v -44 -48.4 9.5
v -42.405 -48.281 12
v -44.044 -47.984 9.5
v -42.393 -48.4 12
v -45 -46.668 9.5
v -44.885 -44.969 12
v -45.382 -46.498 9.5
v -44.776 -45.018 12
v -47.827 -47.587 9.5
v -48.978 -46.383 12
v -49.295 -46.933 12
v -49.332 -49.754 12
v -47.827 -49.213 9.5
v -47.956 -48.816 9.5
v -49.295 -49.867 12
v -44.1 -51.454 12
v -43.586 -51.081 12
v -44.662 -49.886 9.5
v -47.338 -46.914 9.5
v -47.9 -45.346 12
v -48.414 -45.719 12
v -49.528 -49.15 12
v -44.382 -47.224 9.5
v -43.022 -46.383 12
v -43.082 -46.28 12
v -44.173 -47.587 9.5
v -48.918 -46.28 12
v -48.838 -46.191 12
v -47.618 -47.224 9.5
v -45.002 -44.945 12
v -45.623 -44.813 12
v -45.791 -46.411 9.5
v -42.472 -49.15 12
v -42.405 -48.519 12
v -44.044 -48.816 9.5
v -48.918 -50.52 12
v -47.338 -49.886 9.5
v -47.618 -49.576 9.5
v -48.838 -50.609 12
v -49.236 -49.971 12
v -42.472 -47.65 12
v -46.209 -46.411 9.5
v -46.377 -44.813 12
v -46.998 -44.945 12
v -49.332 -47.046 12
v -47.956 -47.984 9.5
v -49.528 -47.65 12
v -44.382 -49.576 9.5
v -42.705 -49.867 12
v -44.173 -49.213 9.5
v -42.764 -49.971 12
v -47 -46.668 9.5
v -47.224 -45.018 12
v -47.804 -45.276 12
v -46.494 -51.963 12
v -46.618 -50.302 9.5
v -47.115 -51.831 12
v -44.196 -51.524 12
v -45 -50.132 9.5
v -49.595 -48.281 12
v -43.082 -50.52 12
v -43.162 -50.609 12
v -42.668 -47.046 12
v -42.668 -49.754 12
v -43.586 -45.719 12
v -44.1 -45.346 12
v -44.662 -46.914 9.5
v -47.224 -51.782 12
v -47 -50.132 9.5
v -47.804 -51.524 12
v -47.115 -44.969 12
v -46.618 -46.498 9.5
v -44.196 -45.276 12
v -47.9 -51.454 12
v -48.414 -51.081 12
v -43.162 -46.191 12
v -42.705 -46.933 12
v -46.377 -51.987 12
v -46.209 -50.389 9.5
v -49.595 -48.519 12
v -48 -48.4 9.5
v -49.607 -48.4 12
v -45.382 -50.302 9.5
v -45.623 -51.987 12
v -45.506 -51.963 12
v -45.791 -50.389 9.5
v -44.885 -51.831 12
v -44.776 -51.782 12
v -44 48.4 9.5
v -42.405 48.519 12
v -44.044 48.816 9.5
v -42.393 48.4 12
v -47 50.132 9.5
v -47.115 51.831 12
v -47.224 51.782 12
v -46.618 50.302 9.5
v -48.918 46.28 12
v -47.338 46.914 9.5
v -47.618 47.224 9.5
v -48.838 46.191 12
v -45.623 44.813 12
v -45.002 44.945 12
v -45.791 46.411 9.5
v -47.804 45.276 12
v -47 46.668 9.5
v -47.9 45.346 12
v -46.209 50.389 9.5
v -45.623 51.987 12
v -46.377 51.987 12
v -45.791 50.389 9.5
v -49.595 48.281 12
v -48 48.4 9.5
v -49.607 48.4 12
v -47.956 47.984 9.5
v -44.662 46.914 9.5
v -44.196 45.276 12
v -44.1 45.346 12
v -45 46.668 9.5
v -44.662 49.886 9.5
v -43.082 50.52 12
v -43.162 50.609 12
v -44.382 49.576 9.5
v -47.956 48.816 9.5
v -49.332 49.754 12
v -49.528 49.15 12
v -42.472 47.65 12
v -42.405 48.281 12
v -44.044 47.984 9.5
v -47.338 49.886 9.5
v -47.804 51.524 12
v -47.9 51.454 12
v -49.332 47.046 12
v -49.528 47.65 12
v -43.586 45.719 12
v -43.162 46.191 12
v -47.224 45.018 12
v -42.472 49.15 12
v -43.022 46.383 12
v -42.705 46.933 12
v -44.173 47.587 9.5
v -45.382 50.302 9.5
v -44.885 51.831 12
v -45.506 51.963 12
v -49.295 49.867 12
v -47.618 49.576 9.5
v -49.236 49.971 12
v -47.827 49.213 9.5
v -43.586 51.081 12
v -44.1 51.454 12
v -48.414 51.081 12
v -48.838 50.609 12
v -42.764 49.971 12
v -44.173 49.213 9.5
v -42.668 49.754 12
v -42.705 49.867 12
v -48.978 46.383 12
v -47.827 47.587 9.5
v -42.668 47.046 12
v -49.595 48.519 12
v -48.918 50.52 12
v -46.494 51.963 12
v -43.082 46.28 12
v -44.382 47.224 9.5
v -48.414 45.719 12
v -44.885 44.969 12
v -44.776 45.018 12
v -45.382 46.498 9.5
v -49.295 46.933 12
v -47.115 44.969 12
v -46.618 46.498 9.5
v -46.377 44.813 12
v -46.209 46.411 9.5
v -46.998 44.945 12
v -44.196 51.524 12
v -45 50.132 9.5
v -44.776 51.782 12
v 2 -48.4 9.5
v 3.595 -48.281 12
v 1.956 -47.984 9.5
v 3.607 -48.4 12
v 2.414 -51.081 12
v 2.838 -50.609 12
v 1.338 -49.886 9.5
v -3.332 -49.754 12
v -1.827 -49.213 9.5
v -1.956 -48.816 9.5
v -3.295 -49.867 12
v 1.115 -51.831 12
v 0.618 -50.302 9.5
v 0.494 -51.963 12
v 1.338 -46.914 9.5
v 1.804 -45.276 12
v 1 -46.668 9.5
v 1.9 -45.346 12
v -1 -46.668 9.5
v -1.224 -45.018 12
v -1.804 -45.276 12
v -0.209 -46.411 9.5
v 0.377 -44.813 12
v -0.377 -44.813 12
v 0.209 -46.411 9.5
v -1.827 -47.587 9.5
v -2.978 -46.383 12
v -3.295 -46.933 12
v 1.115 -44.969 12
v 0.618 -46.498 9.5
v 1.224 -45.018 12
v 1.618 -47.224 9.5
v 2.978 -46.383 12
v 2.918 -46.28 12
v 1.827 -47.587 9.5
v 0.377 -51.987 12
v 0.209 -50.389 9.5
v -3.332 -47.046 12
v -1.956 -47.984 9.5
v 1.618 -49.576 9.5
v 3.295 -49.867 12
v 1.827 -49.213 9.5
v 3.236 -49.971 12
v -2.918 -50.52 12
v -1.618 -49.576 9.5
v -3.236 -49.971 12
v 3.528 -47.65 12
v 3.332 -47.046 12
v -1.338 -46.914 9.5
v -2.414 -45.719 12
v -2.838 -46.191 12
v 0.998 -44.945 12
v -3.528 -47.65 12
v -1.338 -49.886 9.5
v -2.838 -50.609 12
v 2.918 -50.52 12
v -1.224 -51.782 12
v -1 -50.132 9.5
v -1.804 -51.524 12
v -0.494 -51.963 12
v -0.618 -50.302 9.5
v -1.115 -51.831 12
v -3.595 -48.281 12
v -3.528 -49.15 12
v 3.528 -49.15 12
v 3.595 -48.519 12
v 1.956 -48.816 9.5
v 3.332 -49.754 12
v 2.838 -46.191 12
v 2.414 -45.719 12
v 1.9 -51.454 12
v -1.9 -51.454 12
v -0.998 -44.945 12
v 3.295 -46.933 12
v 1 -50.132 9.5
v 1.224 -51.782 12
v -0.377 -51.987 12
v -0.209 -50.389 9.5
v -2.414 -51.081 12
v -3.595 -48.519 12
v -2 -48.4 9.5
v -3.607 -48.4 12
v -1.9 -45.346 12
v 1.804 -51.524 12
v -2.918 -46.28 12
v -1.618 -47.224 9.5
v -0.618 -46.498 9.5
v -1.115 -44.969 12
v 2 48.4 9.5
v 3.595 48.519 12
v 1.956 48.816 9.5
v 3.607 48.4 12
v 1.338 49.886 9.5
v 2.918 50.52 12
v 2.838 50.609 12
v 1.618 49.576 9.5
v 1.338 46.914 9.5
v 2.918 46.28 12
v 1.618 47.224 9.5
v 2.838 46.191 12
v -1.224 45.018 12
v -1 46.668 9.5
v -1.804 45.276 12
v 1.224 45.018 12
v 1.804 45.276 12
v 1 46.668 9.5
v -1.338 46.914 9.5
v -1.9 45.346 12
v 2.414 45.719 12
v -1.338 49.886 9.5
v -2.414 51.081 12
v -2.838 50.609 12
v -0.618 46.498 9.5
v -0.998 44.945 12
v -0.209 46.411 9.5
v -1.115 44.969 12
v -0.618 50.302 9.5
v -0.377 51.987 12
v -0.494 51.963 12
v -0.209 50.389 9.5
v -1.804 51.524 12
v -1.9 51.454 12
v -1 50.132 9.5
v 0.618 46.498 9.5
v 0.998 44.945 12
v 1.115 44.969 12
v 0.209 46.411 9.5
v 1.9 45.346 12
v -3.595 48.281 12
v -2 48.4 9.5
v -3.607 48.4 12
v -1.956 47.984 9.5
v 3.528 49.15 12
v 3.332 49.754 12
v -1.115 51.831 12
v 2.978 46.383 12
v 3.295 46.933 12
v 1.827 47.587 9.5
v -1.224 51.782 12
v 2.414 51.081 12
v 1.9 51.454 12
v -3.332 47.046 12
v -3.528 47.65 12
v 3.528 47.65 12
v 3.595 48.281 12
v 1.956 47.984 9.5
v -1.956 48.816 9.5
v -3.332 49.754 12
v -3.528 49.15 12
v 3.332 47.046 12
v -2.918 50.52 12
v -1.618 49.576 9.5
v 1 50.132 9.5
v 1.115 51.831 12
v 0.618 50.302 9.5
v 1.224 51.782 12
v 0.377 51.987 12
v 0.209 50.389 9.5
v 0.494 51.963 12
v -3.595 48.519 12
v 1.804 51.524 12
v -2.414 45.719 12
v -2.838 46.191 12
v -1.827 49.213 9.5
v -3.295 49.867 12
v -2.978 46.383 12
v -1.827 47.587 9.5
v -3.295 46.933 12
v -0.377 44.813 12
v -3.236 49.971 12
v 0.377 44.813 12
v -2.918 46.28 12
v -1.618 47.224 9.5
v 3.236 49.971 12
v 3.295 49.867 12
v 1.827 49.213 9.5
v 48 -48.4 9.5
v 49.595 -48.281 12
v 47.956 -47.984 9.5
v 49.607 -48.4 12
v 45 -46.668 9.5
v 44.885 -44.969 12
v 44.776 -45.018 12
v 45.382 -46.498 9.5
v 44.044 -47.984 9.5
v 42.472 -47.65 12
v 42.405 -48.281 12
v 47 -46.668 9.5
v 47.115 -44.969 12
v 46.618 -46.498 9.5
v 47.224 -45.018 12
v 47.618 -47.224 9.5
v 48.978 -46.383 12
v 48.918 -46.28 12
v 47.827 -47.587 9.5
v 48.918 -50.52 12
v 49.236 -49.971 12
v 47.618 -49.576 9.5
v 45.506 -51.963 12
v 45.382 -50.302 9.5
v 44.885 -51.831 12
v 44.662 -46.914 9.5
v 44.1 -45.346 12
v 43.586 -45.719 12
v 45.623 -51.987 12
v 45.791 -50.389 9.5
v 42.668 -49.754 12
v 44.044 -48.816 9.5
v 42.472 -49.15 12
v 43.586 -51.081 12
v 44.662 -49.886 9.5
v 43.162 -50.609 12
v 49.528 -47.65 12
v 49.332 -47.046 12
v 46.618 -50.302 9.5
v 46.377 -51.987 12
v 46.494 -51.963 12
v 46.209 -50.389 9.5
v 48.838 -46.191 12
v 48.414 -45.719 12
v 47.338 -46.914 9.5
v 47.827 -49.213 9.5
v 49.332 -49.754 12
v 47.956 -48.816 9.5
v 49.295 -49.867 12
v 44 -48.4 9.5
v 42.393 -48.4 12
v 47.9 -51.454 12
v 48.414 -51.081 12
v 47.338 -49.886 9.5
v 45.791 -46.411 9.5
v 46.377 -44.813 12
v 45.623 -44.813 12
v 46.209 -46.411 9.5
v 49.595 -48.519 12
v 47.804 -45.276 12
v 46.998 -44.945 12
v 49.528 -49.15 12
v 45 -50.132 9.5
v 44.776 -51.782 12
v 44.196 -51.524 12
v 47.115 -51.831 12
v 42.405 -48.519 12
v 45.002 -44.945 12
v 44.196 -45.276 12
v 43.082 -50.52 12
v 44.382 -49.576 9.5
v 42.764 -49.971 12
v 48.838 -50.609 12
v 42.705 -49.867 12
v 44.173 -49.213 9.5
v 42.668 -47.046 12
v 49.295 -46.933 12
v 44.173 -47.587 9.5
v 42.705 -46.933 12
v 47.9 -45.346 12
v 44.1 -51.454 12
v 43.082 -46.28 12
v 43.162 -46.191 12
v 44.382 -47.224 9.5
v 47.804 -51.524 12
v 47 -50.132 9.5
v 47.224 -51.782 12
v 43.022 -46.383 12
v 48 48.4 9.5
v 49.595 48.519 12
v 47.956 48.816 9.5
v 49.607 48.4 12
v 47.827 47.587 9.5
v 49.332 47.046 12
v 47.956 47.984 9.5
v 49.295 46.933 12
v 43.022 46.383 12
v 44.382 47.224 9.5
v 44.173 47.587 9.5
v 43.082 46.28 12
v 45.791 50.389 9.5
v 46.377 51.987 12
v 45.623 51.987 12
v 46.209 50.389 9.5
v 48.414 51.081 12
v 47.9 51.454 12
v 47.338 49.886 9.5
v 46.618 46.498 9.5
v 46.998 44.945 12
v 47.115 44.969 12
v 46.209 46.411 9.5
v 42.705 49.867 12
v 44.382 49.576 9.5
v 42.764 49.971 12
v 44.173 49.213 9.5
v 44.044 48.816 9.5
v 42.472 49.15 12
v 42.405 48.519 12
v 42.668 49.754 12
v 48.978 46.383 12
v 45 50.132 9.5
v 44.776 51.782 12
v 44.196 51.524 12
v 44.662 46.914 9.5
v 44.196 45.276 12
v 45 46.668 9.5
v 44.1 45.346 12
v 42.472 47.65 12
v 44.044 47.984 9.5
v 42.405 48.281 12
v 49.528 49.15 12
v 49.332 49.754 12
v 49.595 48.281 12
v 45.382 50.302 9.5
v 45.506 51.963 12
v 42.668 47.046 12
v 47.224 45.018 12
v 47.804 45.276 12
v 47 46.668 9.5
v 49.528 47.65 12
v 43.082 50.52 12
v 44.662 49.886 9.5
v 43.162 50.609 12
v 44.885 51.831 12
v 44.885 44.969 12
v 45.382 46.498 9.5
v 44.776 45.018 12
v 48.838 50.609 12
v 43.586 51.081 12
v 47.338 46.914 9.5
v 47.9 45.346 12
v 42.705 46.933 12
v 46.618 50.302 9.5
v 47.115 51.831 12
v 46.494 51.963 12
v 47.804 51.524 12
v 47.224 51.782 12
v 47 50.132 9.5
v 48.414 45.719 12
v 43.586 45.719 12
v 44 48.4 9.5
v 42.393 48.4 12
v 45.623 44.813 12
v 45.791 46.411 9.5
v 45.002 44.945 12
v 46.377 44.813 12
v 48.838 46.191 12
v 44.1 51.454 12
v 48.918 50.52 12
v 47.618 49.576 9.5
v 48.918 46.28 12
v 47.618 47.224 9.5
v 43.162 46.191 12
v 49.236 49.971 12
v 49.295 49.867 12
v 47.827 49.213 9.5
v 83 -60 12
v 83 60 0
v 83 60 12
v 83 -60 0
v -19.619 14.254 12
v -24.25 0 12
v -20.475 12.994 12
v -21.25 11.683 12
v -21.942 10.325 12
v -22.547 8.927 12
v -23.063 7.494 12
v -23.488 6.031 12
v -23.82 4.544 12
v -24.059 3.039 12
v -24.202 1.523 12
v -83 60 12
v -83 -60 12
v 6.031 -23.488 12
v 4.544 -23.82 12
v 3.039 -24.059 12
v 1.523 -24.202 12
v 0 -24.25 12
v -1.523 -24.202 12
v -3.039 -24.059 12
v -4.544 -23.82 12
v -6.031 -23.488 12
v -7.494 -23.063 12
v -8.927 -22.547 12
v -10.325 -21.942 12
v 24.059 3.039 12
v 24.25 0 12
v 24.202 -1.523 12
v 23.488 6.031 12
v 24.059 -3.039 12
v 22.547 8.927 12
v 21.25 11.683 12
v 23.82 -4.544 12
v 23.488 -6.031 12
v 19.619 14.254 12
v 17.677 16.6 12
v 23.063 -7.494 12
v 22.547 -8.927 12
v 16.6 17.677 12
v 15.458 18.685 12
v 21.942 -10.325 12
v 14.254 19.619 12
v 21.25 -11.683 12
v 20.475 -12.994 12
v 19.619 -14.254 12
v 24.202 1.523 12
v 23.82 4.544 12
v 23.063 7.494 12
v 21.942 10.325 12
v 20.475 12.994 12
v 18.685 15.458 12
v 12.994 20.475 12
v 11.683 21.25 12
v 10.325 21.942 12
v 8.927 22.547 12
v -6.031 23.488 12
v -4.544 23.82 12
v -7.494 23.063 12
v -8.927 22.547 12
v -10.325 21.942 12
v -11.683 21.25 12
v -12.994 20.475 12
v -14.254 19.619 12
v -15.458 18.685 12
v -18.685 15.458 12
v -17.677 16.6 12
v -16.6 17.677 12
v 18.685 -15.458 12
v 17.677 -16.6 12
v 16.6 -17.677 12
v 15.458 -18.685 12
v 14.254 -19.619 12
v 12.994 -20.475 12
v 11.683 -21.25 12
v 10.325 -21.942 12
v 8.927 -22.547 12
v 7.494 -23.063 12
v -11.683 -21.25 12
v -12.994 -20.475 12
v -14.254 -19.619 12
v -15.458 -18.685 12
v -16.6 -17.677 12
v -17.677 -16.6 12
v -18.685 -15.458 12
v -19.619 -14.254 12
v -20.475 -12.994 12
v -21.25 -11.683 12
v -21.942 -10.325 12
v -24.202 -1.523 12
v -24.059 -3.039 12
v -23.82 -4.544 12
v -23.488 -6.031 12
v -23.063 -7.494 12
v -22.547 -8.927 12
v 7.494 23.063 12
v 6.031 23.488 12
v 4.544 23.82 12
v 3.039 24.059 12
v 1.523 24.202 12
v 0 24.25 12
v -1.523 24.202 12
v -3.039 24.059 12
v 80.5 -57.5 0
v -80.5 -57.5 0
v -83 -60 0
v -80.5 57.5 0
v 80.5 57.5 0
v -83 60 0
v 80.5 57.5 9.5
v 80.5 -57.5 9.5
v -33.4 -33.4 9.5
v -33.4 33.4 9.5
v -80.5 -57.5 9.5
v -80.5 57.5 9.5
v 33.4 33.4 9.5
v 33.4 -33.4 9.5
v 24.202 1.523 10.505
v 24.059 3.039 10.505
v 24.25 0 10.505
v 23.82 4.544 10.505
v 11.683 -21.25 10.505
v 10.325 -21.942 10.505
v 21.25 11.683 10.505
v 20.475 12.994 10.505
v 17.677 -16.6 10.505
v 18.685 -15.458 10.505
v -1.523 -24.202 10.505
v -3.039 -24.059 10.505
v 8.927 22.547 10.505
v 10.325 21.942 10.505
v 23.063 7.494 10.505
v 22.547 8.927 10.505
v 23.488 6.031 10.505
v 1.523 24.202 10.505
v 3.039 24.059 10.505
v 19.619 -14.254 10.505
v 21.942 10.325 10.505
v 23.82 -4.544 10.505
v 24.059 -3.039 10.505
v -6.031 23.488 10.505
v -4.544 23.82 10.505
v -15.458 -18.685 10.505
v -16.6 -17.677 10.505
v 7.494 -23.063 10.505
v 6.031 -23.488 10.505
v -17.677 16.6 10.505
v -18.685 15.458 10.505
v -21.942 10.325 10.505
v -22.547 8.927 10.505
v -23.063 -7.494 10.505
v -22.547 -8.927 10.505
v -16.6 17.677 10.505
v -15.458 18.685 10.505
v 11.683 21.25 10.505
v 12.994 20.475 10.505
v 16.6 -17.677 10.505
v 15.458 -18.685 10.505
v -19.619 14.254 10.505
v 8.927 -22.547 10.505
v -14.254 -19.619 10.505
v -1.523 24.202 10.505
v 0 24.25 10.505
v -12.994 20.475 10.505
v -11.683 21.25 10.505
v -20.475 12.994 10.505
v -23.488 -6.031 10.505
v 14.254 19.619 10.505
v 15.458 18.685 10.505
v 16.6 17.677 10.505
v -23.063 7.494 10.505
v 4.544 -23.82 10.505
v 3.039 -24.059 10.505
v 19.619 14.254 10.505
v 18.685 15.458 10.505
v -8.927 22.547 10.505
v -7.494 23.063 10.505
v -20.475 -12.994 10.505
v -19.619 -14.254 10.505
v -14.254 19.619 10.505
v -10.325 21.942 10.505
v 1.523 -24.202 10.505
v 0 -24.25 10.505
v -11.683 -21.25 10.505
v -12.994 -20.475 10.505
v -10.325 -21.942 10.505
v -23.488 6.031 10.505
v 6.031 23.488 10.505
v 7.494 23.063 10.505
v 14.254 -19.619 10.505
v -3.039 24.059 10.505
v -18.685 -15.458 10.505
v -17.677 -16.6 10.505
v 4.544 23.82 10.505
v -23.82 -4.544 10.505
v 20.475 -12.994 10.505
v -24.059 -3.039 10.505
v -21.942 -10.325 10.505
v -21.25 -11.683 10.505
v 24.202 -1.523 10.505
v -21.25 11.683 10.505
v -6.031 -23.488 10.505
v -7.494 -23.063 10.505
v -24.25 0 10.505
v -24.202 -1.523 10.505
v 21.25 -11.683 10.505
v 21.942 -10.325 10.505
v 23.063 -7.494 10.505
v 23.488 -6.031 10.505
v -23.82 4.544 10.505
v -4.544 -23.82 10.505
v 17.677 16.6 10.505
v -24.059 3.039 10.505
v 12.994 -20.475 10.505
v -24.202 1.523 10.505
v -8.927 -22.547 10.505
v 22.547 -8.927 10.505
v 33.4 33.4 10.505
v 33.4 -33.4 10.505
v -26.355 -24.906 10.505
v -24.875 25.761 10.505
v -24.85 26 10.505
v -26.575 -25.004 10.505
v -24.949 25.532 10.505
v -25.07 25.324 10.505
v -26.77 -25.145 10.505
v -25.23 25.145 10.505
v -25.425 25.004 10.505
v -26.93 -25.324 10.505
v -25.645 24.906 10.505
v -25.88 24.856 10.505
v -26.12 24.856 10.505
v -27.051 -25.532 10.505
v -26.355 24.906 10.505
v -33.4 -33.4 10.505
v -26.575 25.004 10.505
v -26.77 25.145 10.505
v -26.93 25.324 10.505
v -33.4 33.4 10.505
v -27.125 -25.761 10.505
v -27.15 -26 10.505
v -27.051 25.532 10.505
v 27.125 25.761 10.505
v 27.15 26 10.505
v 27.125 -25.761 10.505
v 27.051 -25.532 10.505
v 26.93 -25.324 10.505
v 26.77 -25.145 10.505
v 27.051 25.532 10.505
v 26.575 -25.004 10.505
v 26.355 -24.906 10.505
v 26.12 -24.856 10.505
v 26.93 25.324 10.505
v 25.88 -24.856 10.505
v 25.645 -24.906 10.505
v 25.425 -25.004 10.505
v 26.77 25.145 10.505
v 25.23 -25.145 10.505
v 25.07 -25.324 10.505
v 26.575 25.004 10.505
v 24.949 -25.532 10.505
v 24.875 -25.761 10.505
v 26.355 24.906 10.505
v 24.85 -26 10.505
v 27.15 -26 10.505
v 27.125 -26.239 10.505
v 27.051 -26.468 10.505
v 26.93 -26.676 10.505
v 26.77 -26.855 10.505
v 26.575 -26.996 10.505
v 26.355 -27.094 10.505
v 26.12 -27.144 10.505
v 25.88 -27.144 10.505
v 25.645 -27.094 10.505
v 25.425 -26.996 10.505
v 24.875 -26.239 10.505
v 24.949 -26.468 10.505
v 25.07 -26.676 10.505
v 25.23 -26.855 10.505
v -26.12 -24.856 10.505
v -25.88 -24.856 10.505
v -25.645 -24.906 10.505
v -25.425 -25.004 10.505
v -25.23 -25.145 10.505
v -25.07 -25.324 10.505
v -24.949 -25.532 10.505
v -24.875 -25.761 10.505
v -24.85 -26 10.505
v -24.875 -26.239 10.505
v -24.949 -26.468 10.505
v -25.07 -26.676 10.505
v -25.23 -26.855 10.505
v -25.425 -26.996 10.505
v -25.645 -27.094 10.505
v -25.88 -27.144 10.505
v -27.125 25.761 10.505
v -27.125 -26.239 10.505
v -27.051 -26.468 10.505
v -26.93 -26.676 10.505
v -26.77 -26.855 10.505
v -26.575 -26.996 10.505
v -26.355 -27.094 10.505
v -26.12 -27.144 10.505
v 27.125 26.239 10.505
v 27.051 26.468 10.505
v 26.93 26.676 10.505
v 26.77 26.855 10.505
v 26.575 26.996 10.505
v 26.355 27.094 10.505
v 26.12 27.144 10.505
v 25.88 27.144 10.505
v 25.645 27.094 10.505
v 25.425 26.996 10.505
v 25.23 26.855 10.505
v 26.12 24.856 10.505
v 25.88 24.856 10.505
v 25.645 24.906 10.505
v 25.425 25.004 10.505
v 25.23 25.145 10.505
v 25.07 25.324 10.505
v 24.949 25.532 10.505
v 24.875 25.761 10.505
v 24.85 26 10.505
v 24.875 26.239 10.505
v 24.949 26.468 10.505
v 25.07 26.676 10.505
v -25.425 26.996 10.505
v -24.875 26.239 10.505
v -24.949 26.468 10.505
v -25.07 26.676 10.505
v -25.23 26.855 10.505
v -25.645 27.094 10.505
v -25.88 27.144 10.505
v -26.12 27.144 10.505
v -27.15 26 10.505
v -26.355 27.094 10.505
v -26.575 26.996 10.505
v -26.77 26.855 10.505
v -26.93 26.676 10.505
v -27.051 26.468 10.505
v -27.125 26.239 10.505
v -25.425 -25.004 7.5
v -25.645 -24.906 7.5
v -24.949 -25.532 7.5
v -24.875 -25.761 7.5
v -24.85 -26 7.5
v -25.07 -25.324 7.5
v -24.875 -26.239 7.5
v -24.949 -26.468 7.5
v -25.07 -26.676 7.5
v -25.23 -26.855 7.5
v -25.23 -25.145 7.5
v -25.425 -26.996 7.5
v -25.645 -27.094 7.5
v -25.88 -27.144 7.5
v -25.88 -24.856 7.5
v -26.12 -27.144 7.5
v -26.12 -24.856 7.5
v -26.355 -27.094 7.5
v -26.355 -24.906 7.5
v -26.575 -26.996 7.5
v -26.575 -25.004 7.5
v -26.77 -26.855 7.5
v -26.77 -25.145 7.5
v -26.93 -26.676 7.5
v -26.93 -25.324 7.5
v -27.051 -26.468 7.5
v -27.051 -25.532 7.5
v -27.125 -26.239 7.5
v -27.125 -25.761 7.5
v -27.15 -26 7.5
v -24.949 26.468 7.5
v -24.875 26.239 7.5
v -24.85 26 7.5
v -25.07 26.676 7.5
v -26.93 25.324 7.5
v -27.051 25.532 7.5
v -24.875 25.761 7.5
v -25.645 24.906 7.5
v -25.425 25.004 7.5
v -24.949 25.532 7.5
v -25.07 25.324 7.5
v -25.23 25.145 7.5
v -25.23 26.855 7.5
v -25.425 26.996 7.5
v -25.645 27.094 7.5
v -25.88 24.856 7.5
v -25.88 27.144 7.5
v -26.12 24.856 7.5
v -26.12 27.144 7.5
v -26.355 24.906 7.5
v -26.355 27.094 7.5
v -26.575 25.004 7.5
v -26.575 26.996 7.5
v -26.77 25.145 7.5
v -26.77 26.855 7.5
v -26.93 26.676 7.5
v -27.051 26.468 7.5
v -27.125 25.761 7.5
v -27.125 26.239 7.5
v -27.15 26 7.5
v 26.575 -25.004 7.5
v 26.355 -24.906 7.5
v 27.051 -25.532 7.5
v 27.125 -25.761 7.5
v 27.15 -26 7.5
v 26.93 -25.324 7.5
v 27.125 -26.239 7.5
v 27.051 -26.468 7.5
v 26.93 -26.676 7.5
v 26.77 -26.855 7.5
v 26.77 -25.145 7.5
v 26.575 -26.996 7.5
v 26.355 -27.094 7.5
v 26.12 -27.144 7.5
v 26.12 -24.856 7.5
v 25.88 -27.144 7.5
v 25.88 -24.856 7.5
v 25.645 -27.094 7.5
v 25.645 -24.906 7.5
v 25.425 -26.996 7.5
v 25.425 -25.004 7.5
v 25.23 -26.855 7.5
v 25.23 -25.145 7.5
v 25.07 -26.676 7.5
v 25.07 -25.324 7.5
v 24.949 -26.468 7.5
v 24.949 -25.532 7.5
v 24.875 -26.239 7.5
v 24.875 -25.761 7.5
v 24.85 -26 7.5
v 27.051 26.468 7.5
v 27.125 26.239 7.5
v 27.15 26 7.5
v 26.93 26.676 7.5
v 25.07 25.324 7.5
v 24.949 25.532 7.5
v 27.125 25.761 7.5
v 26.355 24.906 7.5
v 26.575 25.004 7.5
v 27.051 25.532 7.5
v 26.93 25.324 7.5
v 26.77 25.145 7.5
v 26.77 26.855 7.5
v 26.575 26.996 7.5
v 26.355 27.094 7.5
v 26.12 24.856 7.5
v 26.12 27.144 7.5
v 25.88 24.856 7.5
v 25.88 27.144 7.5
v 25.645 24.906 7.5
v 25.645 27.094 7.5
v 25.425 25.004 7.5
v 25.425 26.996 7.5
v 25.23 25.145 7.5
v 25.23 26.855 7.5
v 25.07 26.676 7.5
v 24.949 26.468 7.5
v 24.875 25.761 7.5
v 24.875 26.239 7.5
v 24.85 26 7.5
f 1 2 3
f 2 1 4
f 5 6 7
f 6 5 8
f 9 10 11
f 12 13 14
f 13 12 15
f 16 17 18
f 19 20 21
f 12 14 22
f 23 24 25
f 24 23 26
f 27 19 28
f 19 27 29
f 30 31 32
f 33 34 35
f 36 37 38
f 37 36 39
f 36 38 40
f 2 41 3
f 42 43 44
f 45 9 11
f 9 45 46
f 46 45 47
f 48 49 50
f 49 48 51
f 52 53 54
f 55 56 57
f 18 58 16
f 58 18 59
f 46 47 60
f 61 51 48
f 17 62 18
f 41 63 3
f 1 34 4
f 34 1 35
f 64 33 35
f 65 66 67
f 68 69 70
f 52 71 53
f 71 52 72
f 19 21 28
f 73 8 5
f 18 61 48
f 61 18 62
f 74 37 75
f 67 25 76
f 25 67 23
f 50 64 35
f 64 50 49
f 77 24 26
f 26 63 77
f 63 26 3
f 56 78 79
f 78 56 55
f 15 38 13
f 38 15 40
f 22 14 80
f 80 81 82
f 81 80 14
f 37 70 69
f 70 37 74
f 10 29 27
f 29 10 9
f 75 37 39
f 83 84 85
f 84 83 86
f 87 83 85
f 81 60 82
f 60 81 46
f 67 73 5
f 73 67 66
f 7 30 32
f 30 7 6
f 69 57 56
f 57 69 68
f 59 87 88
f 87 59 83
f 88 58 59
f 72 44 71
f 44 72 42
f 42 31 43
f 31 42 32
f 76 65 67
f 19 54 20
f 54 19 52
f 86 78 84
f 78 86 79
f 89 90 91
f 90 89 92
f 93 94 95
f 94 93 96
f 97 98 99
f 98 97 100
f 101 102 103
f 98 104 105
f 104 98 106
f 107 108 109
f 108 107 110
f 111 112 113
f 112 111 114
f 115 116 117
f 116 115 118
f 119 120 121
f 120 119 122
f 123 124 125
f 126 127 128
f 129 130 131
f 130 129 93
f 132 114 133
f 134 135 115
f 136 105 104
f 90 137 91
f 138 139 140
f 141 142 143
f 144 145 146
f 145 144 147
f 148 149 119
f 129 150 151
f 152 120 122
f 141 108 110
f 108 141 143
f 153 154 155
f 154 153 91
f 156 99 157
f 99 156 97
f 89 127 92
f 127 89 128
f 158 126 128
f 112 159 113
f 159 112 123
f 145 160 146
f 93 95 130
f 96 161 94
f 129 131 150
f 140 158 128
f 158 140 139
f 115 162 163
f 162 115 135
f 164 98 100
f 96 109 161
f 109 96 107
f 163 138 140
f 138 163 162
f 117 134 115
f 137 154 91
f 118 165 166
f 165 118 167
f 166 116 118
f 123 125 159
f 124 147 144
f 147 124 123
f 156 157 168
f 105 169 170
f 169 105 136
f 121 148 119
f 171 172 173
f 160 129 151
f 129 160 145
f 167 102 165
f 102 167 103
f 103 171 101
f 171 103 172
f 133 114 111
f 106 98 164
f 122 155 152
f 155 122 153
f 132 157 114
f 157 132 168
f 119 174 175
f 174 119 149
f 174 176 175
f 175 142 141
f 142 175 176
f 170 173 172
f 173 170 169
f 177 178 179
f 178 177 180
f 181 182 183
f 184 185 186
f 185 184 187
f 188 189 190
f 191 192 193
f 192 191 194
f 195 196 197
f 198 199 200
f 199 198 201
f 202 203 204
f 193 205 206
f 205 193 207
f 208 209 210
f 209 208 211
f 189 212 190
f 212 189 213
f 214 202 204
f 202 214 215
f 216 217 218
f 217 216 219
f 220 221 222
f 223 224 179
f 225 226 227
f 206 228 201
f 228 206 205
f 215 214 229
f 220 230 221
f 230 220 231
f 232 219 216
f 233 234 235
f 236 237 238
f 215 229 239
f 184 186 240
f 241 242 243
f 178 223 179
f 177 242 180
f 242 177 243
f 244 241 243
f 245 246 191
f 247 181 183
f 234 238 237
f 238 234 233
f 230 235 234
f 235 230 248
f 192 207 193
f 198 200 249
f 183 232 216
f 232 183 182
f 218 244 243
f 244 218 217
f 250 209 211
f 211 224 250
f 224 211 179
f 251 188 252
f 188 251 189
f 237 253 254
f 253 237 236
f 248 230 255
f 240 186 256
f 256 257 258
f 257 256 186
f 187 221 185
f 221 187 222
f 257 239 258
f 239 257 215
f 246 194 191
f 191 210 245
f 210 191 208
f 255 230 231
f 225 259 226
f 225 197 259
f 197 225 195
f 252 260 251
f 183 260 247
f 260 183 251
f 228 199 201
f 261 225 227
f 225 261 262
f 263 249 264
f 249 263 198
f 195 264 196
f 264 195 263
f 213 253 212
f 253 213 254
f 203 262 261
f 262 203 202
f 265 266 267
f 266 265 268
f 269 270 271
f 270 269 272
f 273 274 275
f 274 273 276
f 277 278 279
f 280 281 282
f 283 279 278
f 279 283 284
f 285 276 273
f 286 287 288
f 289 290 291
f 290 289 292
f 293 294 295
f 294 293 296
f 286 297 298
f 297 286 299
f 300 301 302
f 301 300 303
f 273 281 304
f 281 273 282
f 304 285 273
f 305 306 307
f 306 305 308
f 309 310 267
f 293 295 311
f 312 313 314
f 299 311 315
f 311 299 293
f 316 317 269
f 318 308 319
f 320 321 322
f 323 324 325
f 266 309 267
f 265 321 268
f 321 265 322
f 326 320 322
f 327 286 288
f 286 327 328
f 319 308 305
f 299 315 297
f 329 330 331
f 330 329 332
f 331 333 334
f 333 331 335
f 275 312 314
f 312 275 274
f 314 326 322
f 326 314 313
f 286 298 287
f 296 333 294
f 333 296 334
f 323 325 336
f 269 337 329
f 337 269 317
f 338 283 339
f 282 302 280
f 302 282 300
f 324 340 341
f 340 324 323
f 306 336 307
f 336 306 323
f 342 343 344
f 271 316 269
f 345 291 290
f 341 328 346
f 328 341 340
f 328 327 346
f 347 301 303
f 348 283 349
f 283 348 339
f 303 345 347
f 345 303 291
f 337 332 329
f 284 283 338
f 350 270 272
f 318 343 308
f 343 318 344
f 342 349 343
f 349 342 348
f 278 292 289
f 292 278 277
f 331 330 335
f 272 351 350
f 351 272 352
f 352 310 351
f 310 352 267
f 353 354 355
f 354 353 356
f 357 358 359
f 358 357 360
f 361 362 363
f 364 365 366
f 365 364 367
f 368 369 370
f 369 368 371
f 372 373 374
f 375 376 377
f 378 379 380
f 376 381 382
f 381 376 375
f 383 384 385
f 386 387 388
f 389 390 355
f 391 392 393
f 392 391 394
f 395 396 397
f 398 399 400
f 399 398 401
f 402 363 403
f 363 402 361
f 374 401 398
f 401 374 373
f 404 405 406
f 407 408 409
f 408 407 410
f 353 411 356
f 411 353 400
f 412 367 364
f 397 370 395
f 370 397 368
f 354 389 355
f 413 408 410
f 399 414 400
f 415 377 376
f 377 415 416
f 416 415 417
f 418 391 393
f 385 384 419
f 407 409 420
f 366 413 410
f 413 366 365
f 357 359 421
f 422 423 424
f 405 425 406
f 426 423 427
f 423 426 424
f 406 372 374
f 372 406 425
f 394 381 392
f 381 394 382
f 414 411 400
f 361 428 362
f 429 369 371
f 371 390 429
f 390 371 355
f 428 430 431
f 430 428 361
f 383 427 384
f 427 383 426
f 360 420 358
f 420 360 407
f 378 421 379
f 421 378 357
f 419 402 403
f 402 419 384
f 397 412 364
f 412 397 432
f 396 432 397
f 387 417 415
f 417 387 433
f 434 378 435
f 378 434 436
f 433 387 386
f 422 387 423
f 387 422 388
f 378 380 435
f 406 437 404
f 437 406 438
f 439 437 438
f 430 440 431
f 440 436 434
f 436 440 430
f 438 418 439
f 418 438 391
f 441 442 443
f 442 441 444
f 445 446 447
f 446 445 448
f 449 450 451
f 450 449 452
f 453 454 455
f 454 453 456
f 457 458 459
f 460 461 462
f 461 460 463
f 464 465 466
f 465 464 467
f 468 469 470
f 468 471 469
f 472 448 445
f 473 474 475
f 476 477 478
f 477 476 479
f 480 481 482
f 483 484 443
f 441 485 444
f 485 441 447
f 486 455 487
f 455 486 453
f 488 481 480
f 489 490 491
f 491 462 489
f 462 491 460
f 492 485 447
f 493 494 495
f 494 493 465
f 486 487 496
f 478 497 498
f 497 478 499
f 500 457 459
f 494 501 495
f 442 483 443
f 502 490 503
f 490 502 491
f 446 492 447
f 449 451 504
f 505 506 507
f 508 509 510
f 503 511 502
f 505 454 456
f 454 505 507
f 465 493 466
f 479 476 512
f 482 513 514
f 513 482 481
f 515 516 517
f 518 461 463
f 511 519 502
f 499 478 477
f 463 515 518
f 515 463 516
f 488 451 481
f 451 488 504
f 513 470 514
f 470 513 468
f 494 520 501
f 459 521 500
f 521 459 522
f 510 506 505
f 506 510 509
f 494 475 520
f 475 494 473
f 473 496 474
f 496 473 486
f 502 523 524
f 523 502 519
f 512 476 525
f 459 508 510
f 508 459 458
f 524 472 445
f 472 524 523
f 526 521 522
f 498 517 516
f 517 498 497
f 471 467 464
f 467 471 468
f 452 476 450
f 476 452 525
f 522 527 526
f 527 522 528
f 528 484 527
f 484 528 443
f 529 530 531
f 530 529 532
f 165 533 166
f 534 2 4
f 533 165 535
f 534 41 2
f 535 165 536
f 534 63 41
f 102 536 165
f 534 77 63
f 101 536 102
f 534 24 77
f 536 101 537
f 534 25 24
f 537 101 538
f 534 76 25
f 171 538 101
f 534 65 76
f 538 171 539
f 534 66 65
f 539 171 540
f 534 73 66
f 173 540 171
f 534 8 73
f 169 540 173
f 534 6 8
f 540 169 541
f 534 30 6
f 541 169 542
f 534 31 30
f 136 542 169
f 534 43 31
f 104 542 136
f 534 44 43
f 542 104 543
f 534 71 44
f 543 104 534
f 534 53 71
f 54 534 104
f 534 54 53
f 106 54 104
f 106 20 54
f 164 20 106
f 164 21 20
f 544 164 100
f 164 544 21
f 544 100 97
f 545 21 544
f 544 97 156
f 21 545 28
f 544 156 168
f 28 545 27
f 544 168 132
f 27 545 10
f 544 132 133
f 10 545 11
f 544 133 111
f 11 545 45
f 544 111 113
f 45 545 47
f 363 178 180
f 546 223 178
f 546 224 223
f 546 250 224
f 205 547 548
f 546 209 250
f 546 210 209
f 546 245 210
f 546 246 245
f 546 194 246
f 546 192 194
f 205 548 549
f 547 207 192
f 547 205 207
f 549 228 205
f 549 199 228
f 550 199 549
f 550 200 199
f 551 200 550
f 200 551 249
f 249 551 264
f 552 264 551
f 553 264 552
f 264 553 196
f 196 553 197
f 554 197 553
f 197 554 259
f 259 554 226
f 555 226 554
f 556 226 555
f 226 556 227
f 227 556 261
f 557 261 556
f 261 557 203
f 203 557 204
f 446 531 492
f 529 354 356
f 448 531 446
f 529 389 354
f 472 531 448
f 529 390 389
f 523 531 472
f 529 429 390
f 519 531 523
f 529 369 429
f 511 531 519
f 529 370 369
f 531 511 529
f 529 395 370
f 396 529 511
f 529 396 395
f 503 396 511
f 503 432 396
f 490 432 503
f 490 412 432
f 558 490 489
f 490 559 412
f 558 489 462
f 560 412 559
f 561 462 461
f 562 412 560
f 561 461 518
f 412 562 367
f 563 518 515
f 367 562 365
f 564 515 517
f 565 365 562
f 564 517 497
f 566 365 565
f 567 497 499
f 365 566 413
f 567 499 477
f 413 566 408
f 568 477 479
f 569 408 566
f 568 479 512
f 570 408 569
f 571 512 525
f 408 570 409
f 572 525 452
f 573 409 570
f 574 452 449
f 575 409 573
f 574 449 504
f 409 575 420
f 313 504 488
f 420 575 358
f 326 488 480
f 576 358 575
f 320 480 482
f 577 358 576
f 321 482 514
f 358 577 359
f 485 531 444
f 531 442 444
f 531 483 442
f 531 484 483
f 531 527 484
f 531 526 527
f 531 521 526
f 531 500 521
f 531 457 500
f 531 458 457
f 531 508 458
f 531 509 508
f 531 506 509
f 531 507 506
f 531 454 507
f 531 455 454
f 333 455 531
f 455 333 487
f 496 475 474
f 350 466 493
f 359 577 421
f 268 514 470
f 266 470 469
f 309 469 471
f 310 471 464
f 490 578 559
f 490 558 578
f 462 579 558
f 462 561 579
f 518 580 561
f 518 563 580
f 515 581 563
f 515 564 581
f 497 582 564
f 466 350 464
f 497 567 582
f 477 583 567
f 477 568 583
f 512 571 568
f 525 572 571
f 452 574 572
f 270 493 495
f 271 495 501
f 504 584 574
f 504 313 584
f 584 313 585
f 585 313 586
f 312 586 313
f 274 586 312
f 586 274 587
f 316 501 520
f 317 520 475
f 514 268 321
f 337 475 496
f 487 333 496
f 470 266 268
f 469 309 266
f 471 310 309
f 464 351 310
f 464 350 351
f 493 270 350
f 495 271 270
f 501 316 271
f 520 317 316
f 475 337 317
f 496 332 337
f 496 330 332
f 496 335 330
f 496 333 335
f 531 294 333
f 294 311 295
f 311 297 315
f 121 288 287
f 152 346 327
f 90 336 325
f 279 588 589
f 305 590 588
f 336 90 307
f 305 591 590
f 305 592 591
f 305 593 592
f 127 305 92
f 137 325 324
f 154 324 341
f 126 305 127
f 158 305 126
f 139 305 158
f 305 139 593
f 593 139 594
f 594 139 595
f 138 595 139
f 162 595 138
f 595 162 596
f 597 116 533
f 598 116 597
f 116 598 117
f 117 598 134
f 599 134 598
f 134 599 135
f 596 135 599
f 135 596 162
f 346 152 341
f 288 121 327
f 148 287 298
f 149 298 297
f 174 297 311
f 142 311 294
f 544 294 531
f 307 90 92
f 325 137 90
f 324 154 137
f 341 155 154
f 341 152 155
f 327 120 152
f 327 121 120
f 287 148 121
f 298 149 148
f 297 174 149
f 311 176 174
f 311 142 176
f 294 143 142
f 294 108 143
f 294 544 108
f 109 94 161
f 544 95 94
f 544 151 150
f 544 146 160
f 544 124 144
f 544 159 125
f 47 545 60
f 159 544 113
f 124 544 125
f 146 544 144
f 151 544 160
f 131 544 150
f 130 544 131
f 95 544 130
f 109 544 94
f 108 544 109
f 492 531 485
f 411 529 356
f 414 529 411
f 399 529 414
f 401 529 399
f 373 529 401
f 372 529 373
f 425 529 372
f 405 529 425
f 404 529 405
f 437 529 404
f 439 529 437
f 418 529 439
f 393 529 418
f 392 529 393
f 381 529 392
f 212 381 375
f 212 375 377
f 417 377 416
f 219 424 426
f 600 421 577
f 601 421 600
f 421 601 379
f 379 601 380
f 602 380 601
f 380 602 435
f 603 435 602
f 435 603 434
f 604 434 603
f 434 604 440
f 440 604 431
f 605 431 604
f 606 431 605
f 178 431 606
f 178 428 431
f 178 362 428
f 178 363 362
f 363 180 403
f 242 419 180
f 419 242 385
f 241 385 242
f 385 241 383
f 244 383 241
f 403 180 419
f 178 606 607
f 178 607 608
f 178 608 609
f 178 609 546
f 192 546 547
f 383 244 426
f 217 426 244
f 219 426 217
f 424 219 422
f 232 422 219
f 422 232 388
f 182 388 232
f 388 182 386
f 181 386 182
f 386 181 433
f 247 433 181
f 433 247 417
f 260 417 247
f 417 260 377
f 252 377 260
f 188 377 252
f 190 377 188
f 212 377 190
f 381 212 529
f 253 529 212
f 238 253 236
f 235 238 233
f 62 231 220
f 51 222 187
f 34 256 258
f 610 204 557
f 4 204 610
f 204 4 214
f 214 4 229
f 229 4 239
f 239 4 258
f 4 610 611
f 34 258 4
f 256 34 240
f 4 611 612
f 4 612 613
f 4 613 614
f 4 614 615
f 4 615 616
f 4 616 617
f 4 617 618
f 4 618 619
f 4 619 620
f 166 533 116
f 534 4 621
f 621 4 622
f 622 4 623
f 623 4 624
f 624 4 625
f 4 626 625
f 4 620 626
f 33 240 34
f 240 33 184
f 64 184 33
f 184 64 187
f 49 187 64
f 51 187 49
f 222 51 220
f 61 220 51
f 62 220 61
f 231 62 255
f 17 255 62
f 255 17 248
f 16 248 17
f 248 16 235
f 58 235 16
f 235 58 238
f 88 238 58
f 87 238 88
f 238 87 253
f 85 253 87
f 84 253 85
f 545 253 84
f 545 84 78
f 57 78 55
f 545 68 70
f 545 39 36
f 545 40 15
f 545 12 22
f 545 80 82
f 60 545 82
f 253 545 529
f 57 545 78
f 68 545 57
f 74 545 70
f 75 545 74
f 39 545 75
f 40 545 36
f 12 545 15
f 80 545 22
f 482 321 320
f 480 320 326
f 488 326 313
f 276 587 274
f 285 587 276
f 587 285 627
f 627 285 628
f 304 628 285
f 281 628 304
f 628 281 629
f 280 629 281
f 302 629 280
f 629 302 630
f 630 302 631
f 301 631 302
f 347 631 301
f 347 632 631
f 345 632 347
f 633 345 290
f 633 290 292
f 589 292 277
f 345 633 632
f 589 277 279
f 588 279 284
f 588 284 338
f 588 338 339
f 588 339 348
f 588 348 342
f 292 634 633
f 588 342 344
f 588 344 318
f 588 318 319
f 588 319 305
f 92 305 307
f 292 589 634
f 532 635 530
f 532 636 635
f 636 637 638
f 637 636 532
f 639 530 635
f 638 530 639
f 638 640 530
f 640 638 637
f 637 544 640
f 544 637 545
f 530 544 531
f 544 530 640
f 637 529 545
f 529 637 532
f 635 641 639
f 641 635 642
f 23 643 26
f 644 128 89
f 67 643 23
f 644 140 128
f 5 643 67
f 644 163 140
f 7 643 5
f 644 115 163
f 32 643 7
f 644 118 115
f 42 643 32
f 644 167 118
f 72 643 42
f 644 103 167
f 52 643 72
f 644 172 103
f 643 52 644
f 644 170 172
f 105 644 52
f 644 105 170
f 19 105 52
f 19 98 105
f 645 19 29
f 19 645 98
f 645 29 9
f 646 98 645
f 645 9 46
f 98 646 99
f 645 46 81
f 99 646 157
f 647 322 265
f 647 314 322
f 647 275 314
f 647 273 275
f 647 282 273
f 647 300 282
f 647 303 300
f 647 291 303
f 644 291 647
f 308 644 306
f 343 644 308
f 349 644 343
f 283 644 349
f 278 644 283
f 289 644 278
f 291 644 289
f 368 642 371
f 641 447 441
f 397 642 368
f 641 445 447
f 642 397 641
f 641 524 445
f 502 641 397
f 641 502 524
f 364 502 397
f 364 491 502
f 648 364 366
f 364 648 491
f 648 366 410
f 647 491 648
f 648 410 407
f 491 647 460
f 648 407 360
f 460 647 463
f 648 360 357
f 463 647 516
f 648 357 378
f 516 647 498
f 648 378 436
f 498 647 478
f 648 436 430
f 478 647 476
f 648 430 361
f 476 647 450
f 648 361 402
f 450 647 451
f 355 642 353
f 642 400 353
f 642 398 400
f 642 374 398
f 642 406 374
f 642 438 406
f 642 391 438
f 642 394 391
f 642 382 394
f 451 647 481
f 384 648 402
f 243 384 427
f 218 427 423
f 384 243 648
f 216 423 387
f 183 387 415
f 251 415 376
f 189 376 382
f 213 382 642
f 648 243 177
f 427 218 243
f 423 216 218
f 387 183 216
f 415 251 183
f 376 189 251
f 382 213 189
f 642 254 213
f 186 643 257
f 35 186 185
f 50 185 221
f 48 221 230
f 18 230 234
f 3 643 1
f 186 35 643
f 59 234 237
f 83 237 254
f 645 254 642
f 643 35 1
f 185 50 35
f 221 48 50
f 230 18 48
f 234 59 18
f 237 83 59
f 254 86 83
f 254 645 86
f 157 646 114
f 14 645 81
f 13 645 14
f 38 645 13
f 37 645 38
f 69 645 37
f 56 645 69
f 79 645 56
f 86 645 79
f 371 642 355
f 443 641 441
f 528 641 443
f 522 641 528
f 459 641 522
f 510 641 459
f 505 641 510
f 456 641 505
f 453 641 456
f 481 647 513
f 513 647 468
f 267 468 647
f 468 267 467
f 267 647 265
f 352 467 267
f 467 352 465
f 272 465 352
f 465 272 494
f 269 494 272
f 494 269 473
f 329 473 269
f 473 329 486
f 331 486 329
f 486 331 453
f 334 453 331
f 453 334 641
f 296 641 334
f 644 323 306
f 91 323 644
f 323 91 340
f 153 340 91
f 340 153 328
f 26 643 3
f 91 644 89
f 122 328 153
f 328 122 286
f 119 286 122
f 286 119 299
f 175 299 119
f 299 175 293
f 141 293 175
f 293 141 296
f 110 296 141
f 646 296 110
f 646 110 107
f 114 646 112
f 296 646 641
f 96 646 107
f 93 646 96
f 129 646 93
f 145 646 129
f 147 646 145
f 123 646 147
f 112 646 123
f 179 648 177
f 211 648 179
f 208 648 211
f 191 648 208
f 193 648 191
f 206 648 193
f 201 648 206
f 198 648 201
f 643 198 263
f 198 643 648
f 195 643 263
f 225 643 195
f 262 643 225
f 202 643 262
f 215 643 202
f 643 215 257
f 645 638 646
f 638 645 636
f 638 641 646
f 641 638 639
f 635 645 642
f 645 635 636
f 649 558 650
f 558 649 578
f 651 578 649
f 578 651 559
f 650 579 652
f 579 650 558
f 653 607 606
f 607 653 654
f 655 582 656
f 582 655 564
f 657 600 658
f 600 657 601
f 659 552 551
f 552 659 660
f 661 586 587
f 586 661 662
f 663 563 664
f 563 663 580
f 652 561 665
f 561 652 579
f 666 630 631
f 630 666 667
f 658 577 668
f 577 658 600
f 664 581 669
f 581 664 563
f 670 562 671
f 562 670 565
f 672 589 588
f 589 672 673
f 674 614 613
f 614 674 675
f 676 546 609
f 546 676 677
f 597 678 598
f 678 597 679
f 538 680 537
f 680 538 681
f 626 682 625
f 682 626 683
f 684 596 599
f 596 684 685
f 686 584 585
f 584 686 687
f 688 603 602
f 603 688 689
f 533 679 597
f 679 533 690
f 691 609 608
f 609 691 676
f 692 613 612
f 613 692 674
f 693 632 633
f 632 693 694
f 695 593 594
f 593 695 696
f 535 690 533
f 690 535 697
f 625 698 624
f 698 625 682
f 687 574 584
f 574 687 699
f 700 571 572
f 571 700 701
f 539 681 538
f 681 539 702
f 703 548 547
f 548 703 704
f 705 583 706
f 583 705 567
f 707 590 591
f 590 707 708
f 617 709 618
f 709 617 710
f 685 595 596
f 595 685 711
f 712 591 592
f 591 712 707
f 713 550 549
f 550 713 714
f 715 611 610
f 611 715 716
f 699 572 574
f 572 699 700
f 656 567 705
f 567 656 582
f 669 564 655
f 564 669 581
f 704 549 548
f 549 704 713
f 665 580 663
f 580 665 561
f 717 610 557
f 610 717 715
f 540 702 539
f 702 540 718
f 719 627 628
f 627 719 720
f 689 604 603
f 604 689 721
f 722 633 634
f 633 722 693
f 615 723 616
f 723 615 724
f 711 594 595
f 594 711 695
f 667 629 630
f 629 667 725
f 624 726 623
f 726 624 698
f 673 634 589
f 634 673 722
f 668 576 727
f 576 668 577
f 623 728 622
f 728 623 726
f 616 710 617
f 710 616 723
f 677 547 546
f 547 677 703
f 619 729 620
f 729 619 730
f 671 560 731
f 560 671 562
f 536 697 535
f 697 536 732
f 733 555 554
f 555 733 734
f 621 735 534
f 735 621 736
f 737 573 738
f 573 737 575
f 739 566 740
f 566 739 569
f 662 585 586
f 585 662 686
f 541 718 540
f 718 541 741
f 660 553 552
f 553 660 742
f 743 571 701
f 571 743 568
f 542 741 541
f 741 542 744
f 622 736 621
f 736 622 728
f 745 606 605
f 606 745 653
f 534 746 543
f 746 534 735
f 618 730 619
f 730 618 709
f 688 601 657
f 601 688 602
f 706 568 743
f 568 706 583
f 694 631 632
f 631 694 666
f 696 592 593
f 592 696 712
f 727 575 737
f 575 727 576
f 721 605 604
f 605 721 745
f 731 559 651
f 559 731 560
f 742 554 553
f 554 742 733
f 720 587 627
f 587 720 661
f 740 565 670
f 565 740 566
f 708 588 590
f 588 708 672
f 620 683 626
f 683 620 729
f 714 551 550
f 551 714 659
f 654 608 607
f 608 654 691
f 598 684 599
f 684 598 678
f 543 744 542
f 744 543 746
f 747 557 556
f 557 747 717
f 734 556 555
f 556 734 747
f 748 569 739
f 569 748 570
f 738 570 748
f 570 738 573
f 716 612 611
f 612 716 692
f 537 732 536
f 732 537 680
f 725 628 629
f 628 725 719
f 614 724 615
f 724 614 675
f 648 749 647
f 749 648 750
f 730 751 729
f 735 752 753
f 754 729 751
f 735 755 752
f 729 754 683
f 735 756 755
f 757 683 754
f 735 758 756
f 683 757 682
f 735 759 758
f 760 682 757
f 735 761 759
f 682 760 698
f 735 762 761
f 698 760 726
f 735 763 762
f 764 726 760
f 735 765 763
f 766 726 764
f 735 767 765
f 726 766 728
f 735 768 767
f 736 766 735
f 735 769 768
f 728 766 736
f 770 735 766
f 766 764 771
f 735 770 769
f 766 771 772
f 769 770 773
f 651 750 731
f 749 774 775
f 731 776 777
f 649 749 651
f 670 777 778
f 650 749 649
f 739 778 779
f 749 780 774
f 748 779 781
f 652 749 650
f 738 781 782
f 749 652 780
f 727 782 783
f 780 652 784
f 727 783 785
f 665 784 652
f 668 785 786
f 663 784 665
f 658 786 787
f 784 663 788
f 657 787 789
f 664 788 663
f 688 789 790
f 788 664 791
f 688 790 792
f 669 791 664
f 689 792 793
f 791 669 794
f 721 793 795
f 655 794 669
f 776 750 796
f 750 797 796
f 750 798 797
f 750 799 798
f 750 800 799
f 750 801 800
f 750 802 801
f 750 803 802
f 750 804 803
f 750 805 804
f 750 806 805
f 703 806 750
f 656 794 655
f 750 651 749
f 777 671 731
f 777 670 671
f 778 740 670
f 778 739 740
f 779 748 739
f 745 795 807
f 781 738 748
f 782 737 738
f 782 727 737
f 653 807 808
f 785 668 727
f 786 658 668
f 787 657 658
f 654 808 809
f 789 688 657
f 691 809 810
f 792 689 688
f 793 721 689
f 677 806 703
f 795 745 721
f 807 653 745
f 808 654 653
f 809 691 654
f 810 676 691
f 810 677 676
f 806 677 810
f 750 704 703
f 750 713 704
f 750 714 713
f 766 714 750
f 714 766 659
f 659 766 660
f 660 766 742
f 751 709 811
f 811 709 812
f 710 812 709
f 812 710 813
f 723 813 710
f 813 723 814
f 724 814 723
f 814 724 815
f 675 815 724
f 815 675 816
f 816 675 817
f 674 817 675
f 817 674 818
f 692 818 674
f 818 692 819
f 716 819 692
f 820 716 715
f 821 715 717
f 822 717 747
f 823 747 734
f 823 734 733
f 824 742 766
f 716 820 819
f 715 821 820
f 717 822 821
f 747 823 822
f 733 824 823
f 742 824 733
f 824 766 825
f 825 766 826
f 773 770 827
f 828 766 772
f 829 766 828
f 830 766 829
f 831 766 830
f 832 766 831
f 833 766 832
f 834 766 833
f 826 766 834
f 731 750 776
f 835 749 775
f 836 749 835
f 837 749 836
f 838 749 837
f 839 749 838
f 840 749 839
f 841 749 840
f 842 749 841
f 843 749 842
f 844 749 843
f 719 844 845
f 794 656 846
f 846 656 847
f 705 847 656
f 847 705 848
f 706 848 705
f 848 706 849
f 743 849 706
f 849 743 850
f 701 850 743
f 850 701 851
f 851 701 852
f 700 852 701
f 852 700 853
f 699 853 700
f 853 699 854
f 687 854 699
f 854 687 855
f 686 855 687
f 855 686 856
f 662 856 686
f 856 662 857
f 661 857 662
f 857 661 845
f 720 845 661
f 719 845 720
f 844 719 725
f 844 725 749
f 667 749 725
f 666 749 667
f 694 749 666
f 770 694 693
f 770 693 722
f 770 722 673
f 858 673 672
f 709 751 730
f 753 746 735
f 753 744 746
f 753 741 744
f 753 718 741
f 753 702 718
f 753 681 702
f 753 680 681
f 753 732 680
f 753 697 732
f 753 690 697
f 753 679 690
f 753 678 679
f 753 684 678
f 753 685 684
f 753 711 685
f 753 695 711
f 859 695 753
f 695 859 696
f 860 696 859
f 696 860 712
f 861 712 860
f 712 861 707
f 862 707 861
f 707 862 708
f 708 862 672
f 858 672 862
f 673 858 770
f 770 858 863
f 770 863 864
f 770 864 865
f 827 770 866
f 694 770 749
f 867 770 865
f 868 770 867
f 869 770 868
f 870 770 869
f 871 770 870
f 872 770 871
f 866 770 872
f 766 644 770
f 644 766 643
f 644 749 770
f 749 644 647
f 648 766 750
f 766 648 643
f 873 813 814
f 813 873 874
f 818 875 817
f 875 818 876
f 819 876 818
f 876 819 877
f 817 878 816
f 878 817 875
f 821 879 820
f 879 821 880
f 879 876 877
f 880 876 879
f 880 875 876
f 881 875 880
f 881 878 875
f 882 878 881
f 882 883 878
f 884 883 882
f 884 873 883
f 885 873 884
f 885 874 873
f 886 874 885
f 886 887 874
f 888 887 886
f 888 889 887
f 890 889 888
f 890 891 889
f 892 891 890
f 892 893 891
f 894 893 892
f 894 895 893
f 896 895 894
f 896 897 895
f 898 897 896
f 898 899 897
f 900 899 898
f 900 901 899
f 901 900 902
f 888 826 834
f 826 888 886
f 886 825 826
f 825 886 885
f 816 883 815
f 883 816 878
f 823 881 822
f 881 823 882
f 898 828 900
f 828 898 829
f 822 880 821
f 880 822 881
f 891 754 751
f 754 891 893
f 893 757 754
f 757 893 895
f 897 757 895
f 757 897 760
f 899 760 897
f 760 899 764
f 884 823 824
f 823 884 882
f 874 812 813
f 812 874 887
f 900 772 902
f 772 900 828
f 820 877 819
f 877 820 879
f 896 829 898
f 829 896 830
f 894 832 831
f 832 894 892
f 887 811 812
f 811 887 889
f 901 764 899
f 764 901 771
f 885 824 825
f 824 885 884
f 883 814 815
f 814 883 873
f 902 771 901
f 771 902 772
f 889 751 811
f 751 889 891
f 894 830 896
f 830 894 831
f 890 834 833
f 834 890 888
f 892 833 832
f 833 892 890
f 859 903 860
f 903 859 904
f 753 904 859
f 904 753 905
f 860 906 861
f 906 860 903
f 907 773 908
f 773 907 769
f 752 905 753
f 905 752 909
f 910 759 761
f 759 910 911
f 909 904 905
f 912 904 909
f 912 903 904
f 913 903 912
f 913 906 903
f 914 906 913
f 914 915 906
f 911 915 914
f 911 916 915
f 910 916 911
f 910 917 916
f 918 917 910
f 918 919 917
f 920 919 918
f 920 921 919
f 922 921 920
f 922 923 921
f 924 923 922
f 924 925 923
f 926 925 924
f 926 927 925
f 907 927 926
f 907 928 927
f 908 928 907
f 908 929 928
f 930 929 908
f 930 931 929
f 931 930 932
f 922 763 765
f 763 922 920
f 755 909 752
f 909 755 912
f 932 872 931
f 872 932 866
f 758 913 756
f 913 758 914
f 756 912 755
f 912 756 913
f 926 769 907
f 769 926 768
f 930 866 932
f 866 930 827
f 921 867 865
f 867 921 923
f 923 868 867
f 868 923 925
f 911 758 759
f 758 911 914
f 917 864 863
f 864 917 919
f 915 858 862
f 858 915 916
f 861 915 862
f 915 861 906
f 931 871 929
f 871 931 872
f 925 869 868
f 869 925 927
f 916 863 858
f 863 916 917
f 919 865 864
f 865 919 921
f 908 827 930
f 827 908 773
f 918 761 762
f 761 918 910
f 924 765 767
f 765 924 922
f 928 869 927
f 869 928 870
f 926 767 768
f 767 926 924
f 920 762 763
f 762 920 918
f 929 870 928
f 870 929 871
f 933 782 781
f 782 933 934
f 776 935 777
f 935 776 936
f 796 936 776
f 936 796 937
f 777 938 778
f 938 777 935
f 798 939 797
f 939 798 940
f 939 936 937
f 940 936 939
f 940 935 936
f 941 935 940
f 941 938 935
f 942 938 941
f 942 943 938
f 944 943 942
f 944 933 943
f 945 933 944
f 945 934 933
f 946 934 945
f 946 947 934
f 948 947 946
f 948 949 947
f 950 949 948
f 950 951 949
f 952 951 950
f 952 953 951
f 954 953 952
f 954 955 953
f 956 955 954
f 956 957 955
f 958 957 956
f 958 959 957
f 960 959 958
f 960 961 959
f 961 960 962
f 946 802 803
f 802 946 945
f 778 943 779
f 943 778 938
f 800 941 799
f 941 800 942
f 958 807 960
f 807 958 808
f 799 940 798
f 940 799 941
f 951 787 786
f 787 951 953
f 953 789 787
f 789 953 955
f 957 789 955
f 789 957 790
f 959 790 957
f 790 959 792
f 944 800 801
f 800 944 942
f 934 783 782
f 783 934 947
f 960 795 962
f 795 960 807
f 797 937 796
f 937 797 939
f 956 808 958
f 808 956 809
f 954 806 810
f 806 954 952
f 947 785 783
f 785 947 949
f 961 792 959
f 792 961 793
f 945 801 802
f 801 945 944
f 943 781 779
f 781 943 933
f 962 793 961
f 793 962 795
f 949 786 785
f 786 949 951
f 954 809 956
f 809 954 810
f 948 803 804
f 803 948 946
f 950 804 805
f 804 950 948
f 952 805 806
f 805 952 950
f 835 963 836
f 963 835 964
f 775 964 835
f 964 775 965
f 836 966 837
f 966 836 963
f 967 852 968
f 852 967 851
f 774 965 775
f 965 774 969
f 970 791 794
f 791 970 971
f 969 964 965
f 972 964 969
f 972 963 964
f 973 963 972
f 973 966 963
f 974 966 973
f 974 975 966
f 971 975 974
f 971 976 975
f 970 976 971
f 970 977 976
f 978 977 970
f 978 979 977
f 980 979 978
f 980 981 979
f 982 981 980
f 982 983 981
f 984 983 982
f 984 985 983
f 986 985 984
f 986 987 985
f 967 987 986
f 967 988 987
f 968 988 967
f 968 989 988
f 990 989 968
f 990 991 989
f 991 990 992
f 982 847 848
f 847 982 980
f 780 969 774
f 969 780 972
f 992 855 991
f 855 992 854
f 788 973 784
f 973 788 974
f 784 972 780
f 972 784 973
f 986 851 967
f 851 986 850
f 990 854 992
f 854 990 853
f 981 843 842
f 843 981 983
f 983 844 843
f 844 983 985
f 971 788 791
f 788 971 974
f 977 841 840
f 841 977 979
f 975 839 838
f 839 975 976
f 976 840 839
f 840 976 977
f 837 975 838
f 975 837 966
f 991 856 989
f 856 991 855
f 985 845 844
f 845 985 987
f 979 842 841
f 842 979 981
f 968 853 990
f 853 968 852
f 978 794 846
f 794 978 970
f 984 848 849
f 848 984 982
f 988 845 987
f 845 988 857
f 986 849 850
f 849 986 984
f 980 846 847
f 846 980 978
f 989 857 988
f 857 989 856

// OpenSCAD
/* [Wall Plate Settings] */

// Number of switches (gangs)
number_of_gangs = 3; // [1:6]

// Total thickness from wall (mm)
plate_depth = 12; // [8:1:20]


/* [Hidden] */
// --- Calculated Dimensions ---
// OpenSCAD will hide these from the Customizer UI
hole_x_spacing = 46.0;   
// Dynamically calculate width: 74mm base + 46mm for each additional switch
plate_width = 74 + ((number_of_gangs - 1) * hole_x_spacing);       
plate_height = 120;
wall_thickness = 2.5;    
hole_y_spacing = 96.8;   

dial_cutout_dia = 48.5;  

// Metal Plate Specs
plate_recess_sq = 66.8;  
plate_recess_depth = 1.0; 
peg_spacing = 52.0;      
peg_dia = 2.3;           
peg_height = 3.0;        

$fn = 100; // Smooth curves

// --- Model Generation ---
union() {
    difference() {
        // 1. Outer Box
        translate([0, 0, plate_depth/2])
            cube([plate_width, plate_height, plate_depth], center=true);
            
        // 2. Hollow out the back
        translate([0, 0, (plate_depth - wall_thickness)/2])
            cube([plate_width - wall_thickness*2, plate_height - wall_thickness*2, plate_depth - wall_thickness], center=true);

        // 3. Center Hole to reveal the metal plate
        translate([0, 0, -1])
            cylinder(h=plate_depth + 2, d=dial_cutout_dia);
            
        // 4. Square Recess for the metal plate (on the inside face)
        translate([0, 0, plate_depth - wall_thickness + plate_recess_depth/2])
            cube([plate_recess_sq, plate_recess_sq, plate_recess_depth + 0.01], center=true);
            
        // 5. Screw Holes and Countersinks (Dynamically generated)
        for(i = [0 : number_of_gangs - 1]) {
            for(y = [-hole_y_spacing/2, hole_y_spacing/2]) {
                // Calculate the X position for this specific switch gang
                translate([(i - (number_of_gangs - 1) / 2) * hole_x_spacing, y, -1])
                    cylinder(h=plate_depth + 2, d=4, $fn=30); 
                // Countersink for flush screw heads
                translate([(i - (number_of_gangs - 1) / 2) * hole_x_spacing, y, plate_depth - 2.5])
                    cylinder(h=3.5, d1=4, d2=8.5, $fn=30); 
            }
        }
    }

    // 6. Alignment Pegs for the metal plate
    for(x = [-peg_spacing/2, peg_spacing/2]) {
        for(y = [-peg_spacing/2, peg_spacing/2]) {
            // Pegs drop down from the ceiling of the square recess
            translate([x, y, plate_depth - wall_thickness + plate_recess_depth - peg_height])
                cylinder(h=peg_height + 1, d=peg_dia, $fn=30);
        }
    }
}
